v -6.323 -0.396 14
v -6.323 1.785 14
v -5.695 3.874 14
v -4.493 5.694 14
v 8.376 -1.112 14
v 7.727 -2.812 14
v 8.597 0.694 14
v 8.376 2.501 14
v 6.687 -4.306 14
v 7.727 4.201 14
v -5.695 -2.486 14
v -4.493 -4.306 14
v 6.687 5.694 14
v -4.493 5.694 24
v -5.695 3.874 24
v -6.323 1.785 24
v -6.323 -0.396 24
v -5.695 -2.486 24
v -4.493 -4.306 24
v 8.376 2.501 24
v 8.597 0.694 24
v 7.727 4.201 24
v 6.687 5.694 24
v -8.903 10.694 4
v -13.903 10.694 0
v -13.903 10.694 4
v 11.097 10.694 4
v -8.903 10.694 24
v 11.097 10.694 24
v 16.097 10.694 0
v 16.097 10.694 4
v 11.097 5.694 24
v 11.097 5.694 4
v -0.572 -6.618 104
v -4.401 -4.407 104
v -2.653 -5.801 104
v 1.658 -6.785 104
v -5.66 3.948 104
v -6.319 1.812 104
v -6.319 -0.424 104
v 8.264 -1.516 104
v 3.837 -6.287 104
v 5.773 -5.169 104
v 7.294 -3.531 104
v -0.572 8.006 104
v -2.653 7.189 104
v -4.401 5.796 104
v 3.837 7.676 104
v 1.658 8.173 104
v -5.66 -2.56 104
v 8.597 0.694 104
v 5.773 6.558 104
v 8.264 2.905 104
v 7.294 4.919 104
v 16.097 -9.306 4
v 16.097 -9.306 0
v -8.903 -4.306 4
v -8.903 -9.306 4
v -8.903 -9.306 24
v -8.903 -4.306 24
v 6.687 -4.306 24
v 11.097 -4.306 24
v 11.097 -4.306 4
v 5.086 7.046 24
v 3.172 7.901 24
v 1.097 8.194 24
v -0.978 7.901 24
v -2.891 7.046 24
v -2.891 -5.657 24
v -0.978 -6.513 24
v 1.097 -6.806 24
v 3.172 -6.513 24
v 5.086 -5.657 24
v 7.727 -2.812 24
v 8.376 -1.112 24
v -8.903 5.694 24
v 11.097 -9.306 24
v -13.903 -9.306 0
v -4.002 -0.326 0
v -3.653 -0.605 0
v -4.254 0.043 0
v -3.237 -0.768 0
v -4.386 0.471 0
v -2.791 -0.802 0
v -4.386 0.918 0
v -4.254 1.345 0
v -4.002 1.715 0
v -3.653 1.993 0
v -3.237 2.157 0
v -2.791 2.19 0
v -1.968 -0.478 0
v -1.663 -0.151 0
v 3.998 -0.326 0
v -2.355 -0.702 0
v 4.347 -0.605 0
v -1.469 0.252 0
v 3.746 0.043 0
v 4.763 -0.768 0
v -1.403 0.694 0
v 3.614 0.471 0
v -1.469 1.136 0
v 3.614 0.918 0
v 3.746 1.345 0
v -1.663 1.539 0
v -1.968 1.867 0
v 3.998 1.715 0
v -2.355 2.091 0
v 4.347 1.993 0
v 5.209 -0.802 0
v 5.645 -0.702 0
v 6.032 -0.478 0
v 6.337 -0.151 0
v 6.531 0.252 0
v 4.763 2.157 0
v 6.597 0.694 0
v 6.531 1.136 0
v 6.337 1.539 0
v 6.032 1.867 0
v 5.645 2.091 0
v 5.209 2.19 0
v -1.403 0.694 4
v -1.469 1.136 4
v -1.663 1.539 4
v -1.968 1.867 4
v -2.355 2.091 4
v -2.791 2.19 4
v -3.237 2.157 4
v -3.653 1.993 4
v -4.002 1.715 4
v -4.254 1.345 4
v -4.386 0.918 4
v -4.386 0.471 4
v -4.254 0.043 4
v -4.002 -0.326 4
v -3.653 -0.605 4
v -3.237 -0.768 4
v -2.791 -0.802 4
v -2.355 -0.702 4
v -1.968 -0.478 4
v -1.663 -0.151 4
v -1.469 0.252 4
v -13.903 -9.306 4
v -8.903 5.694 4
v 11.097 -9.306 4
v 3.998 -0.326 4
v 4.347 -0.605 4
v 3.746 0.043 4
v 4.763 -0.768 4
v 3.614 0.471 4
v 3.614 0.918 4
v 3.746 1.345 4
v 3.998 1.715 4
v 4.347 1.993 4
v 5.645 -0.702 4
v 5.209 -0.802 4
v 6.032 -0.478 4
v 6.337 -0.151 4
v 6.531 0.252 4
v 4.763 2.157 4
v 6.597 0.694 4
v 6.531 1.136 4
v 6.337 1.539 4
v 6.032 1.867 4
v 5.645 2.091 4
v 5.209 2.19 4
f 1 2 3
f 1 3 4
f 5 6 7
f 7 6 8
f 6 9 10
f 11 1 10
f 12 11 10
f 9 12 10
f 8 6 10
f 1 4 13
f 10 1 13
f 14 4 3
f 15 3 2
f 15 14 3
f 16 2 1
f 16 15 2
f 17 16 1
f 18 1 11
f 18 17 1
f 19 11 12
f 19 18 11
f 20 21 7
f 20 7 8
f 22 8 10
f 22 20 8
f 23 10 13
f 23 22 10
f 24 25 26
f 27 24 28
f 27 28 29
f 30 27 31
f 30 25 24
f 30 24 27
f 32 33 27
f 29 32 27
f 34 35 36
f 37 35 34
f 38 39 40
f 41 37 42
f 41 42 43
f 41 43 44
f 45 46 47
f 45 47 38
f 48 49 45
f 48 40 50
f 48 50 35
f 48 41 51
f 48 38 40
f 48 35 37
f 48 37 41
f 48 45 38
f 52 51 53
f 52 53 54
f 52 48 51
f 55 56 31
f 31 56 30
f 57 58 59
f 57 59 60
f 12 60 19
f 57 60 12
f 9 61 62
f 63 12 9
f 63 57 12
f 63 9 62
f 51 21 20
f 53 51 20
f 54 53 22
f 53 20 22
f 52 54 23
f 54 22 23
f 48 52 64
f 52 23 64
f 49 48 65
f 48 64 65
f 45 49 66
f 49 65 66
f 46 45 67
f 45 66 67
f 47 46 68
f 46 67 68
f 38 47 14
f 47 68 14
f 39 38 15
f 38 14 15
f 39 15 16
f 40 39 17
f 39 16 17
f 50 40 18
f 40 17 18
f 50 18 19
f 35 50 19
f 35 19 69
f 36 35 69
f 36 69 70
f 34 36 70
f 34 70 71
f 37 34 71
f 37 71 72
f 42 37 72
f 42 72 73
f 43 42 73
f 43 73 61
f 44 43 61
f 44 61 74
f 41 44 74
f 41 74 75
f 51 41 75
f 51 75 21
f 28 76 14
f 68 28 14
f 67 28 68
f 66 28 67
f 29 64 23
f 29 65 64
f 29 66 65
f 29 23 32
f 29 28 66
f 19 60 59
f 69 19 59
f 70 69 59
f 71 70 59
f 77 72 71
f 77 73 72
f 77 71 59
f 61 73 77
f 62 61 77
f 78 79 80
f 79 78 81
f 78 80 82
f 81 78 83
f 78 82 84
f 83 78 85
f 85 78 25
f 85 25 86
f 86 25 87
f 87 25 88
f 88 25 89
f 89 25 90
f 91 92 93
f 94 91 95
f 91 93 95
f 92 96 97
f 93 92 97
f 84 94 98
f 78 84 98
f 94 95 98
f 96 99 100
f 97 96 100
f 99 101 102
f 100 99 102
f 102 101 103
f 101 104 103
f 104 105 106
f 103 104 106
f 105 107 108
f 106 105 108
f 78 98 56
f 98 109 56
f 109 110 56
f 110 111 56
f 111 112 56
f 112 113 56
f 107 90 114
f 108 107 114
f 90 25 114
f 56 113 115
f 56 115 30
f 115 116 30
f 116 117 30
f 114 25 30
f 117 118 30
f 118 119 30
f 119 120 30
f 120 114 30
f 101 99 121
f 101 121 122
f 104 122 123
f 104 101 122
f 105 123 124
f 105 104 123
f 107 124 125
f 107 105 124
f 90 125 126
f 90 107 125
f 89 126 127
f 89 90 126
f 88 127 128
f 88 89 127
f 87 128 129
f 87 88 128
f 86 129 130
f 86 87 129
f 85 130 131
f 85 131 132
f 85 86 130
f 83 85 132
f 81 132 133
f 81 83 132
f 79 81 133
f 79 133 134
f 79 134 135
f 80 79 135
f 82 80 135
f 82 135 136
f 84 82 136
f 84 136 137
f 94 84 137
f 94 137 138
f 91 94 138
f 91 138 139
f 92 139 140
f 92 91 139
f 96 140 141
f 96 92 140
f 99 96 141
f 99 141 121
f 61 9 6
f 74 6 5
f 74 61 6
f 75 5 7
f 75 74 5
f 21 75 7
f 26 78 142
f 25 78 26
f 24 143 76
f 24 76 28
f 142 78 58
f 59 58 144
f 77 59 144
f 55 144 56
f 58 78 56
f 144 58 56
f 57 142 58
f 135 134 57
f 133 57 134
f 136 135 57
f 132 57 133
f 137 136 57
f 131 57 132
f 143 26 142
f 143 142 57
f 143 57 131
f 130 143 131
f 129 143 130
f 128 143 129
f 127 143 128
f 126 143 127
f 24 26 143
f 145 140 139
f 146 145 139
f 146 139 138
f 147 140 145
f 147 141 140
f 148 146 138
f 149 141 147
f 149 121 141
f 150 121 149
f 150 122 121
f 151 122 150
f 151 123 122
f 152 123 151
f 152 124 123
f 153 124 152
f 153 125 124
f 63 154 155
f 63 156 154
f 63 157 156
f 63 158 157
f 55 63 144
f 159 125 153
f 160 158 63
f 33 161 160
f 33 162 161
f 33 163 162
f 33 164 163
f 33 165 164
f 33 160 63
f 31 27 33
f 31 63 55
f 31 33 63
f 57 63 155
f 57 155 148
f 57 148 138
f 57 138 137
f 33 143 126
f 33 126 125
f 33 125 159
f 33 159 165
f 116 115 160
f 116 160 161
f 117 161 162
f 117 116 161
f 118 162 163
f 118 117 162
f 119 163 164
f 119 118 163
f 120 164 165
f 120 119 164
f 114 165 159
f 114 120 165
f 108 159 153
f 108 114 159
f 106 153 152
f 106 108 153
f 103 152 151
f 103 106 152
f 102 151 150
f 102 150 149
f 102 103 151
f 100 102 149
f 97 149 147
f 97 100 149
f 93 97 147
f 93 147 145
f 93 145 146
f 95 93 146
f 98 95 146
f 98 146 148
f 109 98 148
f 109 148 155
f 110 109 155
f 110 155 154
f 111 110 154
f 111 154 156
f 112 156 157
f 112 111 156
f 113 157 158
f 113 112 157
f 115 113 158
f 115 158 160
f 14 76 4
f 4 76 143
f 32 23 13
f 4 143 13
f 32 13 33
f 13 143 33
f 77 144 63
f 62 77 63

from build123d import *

# Parameters (mm, degrees)
SKETCH_1_W           = 30
SKETCH_1_H           = 20
SKETCH_1_R           = 1.5
EXTRUDE_1_DEPTH      = 4
SKETCH_2_W           = 20
SKETCH_2_H           = 5
EXTRUDE_2_DEPTH      = 20
SKETCH_3_R           = 7.5
EXTRUDE_3_DEPTH      = 80
EXTRUDE_3_DEPTH_BACK = 10


with BuildPart() as part:
    # 草图1 → 凸台-拉伸1 (new body)
    with BuildSketch(Plane.XY):
        with Locations((1.097142857, 0.694285714)):
            Rectangle(SKETCH_1_W, SKETCH_1_H)
        with Locations((-2.902857143, 0.694285714)):
            Circle(SKETCH_1_R, mode=Mode.SUBTRACT)
        with Locations((5.097142857, 0.694285714)):
            Circle(SKETCH_1_R, mode=Mode.SUBTRACT)
    extrude(amount=EXTRUDE_1_DEPTH)

    # 草图2 → 凸台-拉伸2 (add)
    with BuildSketch(Plane.XY.offset(4)):
        with Locations((1.097142857, 8.194285714)):
            Rectangle(SKETCH_2_W, SKETCH_2_H)
        with Locations((1.097142857, -6.805714286)):
            Rectangle(SKETCH_2_W, SKETCH_2_H)
    extrude(amount=EXTRUDE_2_DEPTH)

    # 草图3 → 凸台-拉伸3 (add, two sides)
    with BuildSketch(Plane.XY.offset(24)) as extrude_3_sk:
        with Locations((1.097142857, 0.694285714)):
            Circle(SKETCH_3_R)
    extrude(amount=EXTRUDE_3_DEPTH)
    extrude(extrude_3_sk.sketch, amount=-EXTRUDE_3_DEPTH_BACK)


solid = part.part
